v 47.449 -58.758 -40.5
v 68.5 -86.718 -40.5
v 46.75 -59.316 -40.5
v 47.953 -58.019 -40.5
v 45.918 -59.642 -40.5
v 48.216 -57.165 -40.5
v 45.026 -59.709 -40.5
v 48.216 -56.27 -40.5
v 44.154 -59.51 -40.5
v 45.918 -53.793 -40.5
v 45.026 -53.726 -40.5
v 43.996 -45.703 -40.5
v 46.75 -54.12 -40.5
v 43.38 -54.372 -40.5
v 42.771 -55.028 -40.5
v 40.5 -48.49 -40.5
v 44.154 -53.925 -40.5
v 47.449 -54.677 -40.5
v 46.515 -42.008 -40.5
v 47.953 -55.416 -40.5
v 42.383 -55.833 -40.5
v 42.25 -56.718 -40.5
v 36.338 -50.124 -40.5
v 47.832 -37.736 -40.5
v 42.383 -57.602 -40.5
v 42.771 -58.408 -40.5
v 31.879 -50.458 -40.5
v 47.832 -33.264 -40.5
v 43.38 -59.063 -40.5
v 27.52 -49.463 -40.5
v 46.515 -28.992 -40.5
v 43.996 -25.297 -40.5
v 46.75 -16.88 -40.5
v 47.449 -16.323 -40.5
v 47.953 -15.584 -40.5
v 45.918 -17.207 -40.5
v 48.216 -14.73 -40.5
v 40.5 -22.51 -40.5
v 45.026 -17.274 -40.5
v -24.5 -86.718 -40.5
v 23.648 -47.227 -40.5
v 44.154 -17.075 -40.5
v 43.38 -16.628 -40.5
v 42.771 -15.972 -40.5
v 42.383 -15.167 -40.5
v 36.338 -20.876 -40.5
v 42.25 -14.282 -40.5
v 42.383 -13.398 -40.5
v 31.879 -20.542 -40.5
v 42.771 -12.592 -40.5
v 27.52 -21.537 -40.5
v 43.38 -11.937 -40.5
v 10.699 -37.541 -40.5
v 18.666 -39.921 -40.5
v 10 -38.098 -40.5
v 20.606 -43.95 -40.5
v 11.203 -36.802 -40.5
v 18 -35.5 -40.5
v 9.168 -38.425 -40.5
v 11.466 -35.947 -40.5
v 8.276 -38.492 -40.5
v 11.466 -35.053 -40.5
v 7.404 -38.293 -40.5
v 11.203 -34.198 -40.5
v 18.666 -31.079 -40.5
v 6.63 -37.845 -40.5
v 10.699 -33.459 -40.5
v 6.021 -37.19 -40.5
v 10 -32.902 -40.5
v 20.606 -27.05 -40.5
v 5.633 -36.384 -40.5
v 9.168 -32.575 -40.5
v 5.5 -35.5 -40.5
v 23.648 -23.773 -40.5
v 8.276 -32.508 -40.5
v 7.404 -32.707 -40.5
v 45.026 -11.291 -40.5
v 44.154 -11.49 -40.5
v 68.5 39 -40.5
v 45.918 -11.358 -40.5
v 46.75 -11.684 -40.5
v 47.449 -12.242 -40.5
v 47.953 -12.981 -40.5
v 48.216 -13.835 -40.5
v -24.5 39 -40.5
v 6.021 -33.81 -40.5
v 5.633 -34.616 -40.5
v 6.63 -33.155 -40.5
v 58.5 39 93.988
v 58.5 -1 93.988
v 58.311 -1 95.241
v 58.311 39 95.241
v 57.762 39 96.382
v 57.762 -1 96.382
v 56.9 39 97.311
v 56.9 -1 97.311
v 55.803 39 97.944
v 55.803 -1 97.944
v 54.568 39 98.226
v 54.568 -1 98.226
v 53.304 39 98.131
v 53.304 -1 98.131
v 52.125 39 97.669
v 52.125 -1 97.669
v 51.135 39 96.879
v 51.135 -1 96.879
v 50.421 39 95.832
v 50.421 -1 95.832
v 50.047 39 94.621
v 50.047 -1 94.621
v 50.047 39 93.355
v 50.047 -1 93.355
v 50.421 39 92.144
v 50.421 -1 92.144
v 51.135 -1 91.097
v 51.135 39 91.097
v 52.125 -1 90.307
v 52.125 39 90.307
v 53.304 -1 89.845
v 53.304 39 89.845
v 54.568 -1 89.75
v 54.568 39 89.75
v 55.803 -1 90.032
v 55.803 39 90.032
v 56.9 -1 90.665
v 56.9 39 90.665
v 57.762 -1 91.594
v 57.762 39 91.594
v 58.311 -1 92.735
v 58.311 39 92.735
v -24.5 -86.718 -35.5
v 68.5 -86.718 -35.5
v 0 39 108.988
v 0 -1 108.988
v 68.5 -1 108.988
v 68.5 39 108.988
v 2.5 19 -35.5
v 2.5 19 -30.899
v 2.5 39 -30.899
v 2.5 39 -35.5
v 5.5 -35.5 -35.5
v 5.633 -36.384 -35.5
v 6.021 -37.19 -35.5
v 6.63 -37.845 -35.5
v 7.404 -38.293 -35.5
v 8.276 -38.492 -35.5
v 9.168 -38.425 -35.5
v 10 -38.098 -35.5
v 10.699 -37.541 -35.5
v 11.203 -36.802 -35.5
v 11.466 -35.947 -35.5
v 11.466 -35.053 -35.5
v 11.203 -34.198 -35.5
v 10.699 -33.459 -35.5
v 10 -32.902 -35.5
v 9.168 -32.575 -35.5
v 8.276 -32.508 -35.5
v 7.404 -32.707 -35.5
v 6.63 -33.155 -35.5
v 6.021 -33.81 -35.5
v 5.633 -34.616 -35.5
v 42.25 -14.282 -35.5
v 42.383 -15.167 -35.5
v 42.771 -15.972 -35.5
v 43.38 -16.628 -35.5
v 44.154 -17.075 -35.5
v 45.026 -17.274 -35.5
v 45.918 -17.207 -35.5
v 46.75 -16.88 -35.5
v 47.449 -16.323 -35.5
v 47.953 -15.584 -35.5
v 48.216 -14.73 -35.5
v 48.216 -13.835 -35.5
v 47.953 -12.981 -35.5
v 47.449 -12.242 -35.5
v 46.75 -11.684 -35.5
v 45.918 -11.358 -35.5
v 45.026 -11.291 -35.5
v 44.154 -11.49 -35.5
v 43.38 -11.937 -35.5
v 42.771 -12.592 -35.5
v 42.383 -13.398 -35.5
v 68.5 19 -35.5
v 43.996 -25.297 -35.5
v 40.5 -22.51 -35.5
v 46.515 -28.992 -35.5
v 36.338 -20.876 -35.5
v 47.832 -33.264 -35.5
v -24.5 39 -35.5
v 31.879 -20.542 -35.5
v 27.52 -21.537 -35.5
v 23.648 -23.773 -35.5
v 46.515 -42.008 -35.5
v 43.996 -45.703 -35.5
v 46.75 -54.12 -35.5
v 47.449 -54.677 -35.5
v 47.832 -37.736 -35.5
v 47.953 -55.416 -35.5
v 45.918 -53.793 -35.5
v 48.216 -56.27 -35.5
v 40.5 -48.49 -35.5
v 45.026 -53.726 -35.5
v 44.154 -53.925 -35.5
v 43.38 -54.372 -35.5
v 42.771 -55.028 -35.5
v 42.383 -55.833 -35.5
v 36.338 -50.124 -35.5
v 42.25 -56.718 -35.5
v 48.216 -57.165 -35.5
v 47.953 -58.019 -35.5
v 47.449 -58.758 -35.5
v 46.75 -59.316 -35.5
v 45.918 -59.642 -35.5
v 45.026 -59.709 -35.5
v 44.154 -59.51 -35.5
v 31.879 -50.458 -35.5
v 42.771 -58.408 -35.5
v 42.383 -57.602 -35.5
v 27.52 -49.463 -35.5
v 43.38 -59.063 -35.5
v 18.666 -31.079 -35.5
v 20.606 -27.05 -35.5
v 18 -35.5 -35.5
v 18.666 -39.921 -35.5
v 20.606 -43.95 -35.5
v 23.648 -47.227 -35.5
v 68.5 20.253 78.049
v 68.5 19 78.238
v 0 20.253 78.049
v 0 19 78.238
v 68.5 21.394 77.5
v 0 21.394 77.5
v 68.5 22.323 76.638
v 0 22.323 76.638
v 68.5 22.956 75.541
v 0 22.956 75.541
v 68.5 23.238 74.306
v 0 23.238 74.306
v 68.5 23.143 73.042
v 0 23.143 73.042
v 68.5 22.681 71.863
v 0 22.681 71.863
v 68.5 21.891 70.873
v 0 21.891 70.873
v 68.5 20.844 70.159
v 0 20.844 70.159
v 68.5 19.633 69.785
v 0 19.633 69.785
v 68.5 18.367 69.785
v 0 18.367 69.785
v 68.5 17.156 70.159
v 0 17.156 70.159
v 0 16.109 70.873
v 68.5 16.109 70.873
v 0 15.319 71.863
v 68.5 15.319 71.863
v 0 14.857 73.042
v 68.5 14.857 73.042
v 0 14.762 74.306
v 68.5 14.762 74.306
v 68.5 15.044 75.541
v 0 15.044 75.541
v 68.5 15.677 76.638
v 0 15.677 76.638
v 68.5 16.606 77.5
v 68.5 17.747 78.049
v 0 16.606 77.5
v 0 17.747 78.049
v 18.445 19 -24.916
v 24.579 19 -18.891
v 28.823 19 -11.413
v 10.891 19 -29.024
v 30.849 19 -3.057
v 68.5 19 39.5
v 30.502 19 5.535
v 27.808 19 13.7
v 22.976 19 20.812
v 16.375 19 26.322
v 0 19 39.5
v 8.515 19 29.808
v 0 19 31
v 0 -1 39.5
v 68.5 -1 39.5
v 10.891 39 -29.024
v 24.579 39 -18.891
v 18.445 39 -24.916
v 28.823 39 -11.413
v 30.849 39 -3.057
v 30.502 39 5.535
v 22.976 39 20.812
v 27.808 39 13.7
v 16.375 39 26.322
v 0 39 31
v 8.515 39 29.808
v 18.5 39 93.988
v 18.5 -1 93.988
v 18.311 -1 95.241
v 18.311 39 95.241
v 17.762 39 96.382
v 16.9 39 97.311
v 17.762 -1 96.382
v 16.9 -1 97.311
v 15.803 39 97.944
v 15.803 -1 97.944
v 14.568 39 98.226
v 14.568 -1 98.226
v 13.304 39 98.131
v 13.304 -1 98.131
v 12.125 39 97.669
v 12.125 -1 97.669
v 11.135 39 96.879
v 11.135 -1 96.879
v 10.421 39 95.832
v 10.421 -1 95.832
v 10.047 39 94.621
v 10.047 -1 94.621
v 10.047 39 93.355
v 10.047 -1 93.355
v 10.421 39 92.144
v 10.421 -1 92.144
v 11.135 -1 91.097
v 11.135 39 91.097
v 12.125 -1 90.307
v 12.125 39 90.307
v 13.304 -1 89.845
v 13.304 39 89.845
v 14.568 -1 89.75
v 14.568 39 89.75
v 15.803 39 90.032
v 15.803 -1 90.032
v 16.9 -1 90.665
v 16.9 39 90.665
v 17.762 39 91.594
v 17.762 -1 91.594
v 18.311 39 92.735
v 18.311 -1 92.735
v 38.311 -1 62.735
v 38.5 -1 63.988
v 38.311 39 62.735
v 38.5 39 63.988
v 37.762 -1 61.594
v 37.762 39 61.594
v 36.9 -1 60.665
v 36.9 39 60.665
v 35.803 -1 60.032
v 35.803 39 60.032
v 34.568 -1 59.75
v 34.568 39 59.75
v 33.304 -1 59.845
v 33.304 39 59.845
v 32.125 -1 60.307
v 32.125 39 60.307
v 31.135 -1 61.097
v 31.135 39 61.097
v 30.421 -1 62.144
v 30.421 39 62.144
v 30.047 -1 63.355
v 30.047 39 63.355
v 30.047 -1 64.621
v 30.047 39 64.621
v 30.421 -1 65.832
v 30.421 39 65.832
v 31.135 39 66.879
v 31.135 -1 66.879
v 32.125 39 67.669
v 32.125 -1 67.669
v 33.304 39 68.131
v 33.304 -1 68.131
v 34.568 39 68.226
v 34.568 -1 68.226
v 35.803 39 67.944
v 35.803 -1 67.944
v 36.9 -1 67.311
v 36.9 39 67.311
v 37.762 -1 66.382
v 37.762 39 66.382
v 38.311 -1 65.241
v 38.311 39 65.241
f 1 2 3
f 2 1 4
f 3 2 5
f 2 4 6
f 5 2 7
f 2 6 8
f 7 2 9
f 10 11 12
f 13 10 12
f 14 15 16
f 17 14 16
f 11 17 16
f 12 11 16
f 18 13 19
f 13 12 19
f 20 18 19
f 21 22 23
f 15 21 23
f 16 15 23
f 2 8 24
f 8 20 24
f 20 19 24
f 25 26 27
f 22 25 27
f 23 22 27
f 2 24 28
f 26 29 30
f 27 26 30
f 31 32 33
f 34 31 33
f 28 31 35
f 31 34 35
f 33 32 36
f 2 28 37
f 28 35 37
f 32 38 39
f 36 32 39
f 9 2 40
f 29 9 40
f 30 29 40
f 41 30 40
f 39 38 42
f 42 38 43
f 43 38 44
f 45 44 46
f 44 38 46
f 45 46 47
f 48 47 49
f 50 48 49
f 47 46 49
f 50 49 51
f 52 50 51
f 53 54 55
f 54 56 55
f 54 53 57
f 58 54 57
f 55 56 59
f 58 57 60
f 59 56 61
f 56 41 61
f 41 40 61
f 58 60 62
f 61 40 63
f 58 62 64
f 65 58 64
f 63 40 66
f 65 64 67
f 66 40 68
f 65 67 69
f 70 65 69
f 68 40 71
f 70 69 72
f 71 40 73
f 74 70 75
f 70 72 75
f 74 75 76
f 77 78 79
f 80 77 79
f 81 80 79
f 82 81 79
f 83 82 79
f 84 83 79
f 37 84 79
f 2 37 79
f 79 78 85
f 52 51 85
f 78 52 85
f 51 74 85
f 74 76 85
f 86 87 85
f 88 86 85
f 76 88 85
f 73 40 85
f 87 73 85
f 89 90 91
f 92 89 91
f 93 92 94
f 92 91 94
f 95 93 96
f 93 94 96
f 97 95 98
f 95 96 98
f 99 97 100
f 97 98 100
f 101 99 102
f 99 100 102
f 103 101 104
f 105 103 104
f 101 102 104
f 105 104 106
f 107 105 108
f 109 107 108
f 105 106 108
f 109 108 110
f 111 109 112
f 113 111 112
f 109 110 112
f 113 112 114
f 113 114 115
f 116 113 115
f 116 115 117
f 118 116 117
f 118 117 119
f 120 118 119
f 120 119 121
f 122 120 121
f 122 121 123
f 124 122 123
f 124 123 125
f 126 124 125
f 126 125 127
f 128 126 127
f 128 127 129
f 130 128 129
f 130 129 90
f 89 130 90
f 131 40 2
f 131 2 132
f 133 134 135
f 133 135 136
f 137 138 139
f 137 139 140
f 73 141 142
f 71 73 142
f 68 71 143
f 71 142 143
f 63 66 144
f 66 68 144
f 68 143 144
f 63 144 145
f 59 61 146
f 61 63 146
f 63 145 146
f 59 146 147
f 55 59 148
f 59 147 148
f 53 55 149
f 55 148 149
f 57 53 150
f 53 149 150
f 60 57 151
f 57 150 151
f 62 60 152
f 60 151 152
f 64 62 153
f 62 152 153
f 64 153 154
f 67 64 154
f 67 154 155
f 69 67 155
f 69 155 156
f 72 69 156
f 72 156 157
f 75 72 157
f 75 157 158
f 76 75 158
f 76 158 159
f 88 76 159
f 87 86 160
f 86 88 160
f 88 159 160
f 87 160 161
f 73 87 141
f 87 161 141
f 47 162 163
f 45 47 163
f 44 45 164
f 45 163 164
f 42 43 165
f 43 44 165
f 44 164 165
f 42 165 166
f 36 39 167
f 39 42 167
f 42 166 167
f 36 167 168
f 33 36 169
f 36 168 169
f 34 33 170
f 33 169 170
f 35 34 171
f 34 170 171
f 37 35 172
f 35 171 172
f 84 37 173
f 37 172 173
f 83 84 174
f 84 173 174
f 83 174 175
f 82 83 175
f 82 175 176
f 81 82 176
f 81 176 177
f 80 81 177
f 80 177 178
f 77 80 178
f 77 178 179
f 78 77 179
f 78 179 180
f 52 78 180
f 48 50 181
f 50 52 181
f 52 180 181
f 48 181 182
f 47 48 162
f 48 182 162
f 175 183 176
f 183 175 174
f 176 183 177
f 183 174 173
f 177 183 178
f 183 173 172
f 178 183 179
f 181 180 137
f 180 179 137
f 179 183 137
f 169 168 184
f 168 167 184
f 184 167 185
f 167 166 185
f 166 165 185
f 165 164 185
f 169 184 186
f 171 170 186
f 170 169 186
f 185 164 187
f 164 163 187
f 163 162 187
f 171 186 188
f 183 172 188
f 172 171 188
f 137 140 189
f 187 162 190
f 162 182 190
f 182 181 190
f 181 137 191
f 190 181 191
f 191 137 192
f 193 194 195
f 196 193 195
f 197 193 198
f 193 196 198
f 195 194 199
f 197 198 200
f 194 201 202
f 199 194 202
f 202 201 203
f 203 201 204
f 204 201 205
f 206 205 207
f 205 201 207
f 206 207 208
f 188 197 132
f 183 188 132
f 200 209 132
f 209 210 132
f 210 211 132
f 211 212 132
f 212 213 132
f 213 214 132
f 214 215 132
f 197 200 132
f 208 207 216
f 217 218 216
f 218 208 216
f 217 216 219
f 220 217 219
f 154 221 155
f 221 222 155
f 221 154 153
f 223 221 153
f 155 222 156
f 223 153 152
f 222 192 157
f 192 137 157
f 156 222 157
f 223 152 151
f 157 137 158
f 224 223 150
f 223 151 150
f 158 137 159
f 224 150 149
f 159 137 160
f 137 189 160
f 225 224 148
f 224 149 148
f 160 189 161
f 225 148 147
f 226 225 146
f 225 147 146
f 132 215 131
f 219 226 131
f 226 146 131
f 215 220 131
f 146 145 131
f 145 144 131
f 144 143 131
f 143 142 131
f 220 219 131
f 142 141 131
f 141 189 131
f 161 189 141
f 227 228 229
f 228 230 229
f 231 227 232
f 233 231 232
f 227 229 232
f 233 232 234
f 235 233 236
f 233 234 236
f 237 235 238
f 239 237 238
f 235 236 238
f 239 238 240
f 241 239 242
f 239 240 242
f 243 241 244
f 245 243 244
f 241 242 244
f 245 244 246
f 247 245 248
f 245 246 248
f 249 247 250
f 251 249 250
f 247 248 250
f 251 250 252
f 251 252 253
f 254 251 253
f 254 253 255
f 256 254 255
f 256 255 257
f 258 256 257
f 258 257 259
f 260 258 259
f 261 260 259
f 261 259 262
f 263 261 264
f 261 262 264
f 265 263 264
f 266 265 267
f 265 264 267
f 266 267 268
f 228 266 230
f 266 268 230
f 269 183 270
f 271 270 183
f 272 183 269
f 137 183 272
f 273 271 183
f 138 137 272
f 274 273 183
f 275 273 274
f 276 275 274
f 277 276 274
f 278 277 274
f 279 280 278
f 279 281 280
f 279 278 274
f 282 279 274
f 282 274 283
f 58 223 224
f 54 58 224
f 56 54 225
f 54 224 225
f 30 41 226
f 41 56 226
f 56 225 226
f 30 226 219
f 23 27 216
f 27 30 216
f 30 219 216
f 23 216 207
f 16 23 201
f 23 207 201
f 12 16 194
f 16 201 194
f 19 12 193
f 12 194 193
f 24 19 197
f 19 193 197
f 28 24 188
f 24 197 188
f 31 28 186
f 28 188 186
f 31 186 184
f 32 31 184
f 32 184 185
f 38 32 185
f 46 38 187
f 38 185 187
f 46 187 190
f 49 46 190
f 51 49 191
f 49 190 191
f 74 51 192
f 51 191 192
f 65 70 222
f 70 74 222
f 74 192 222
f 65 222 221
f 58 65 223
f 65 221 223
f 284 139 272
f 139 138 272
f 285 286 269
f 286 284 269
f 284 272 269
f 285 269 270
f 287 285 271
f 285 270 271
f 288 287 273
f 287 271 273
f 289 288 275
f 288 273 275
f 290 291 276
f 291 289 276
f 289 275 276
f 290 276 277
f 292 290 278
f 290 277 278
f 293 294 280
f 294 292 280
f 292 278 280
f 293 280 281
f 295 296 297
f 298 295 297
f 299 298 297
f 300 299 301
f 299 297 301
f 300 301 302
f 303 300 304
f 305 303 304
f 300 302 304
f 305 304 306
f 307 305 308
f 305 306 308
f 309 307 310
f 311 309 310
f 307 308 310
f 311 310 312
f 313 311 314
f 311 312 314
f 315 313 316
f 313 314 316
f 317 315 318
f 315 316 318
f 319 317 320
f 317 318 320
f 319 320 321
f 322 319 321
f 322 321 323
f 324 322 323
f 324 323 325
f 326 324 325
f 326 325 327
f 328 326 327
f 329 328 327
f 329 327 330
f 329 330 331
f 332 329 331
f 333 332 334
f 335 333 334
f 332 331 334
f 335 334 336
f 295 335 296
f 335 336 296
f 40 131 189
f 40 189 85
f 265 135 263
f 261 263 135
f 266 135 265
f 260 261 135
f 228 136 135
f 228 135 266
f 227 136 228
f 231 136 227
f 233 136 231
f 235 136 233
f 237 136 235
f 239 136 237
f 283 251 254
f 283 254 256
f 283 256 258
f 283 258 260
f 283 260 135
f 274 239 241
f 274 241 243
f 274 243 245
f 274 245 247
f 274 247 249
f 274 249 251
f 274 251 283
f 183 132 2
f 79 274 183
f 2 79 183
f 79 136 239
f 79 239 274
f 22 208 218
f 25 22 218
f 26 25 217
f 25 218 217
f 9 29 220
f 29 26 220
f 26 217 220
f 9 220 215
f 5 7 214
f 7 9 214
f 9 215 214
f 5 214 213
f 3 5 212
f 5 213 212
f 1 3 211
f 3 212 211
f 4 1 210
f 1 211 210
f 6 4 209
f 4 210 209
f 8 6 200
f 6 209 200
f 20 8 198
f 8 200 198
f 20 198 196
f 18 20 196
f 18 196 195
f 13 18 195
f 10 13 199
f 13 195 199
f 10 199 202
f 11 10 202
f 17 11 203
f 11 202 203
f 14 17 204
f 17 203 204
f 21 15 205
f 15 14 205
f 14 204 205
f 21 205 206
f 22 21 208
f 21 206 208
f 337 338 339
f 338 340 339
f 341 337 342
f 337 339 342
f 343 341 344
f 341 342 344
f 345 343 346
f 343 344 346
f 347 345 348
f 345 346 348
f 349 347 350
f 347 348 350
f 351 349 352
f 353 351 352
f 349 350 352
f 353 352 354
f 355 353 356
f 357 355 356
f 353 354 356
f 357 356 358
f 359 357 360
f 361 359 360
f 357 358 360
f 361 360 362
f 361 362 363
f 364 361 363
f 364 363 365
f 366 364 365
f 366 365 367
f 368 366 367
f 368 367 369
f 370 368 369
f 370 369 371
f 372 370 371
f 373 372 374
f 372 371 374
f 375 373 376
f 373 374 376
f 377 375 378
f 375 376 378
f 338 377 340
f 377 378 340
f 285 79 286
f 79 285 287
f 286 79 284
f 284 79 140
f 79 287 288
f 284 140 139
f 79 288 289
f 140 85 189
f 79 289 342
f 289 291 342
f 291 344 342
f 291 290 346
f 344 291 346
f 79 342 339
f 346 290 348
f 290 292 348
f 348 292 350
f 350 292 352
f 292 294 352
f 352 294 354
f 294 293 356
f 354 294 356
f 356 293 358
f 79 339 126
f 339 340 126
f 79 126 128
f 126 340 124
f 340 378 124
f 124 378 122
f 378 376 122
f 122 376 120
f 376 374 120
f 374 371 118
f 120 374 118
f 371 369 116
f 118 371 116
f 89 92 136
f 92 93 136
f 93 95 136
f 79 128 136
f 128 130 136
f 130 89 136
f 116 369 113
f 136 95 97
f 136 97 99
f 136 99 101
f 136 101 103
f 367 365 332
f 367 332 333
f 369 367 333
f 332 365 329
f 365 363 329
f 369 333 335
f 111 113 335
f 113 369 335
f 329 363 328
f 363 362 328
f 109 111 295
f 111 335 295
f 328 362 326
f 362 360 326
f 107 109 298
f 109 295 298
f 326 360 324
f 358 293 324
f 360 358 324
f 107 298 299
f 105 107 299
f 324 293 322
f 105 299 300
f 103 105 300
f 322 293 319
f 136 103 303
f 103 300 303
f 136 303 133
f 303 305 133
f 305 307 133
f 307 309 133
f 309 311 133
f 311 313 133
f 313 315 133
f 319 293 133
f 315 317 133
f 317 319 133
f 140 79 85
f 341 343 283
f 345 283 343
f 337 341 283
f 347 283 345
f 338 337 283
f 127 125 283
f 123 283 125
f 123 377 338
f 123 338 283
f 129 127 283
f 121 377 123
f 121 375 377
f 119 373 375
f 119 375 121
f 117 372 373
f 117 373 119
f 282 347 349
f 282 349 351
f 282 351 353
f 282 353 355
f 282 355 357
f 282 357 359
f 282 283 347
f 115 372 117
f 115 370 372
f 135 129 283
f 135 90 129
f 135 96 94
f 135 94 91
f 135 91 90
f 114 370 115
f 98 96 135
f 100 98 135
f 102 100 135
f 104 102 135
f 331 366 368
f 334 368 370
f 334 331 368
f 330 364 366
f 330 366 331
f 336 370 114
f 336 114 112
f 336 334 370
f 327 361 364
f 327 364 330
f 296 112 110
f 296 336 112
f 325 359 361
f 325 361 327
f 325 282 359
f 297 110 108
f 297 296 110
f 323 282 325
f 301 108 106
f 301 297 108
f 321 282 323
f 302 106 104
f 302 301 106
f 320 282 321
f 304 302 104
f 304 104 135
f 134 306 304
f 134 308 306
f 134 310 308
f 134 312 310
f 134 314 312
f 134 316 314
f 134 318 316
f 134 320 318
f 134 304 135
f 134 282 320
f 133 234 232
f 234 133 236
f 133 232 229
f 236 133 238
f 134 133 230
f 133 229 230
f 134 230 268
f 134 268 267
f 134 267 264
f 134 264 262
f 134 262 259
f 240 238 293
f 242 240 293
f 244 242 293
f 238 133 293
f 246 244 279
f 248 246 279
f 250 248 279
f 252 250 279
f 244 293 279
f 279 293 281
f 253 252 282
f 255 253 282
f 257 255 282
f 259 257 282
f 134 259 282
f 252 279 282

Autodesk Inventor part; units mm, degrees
ref_plane "YZ Plane" through (0, 0, 0) normal (1, 0, 0) x (0, 1, 0)
ref_plane "XZ Plane" through (0, 0, 0) normal (0, 1, 0) x (-1, 0, 0)
ref_plane "Work Plane1" through (8.5, -35.5, -35.5) normal (0, 0, -1) x (-1, 0, 0)
sketch "Sketch1" plane through (8.5, -35.5, -35.5) normal (0, 0, -1) x (-1, 0, 0)
  circle A0 centre (0, 0) radius 3 projected
  circle A1 centre (0, 0) radius 6 projected
  circle A2 centre (-36.75, -21.2176) radius 3 projected
  circle A3 centre (-36.75, -21.2176) radius 6 projected
  circle A4 centre (-36.75, 21.2176) radius 6 projected
  circle A5 centre (-36.75, 21.2176) radius 3 projected
  line L0 (-36.75, -46.2176) -> (28, -46.2176)
  line L1 (28, -46.2176) -> (28, 0)
  line L2 (-36.75, -46.2176) -> (-59, -46.2176)
  line L3 (-59, -46.2176) -> (-59, 34.5)
  line L4 (-59, 34.5) -> (28, 34.5)
  line L5 (34.5, 35.5) -> (-17.5, 35.5) projected
  line L6 (28, 34.5) -> (28, 0)
  circle A6 centre (-24.5, 0) radius 11 projected
  circle A7 centre (-24.5, 0) radius 15
  point P0 (8.5, 35.5)
  dimension "d3" = 30
extrude "Extrusion1" add sketch "Sketch1" along normal blind 5 contours A1 | A3 | A4 | L2 L3 L4 L6 L1 L0
sketch "Sketch2" plane through (-19.5, -81.7176, -35.5) normal (-1, 0, 0) x (0, 0, 1)
  line L0 (0, 0) -> (0, 80.7176) projected
  line L1 (0, 80.7176) -> (-5, 80.7176) projected
  line L2 (-5, 0) -> (-5, 80.7176) projected
  line L3 (0, 0) -> (-5, 0) projected
  point P0 (35.5, 81.7176)
extrude "Extrusion2" add sketch "Sketch2" along normal blind 5
sketch "Sketch3" plane through (67.5, -81.7176, -40.5) normal (0, -1, 0) x (1, 0, 0)
  line L0 (0, 5) -> (-92, 5) projected
  line L1 (-92, 0) -> (-92, 5) projected
  line L2 (0, 0) -> (-92, 0) projected
  line L3 (0, 5) -> (0, 0) projected
  point P0 (-67.5, 40.5)
extrude "Extrusion3" add sketch "Sketch3" along normal blind 5
sketch "Sketch4" plane through (8.5, -35.5, -35.5) normal (0, 0, 1) x (1, 0, 0)
  line L0 (-28, -46.2176) -> (-28, 34.5)
  line L1 (-28, -46.2176) -> (59, -46.2176)
  line L2 (59, -51.2176) -> (-33, -51.2176) projected
  line L3 (-33, 34.5) -> (-33, -51.2176) projected
  line L4 (59, 34.5) -> (59, -51.2176) projected
  line L5 (59, 34.5) -> (-33, 34.5) projected
  line L6 (-28, -46.2176) -> (-33, -46.2176)
  line L7 (-33, 34.5) -> (-33, -51.2176) projected
extrude "Extrusion4" add sketch "Sketch4" along normal blind 75 contours L1 L4 L2 L3 L6
sketch "Sketch5" plane through (67.5, -86.7176, -40.5) normal (0, -1, 0) x (1, 0, 0)
  line L0 (-92, 5) -> (-92, 80) projected
  line L1 (-92, 80) -> (-77.75, 80)
  line L2 (-92, 80) -> (0, 80) projected
  line L3 (-77.75, 80) -> (-37.75, 80)
  line L4 (-37.75, 80) -> (-37.75, 65)
  line L5 (-37.75, 65) -> (-77.75, 65)
  circle A0 centre (-77.75, 65) radius 4.25
  circle A1 centre (-37.75, 65) radius 4.25
  point P0 (-67.5, 40.5)
  dimension "d14" = 14.25
  dimension "d15" = 40
  dimension "d16" = 15
  dimension "d17" = 8.5
  dimension "d18" = 8.5
extrude "Extrusion5" cut sketch "Sketch5" against normal through all
sketch "Sketch6" plane through (67.5, -1, -35.5) normal (0, 1, 0) x (1, 0, 0)
  line L0 (0, 0) -> (-92, 0) projected
  line L1 (0, 0) -> (0, 5) projected
  line L2 (0, 5) -> (-92, 5) projected
  line L3 (-92, 0) -> (-92, 5) projected
  point P0 (-67.5, -35.5)
extrude "Extrusion6" add sketch "Sketch6" along normal blind 20
sketch "Sketch7" plane through (67.5, 19, -35.5) normal (0, 1, 0) x (1, 0, 0)
  circle A0 centre (-67.5, -35.5) radius 31 projected
  circle A1 centre (-67.5, -35.5) radius 31 projected
  circle A2 centre (-67.5, -35.5) radius 31 projected
  line L0 (-67.5, -66.5) -> (-67.5, -75)
  line L1 (0, -75) -> (-92, -75) projected
  line L2 (0, 5) -> (0, -75) projected
  line L3 (-67.5, -75) -> (0, -75)
  line L4 (0, -75) -> (0, 5)
  line L5 (-65, -20.5) -> (-65, 0) projected
  line L6 (-65, -4.601) -> (-65, 0)
  line L7 (-92, 5) -> (-92, 0) projected
  line L8 (-92, 0) -> (0, 0) projected
  line L9 (0, 0) -> (0, 5) projected
  line L10 (0, 5) -> (-92, 5) projected
  point P0 (-65, -4.601)
extrude "Extrusion7" add sketch "Sketch7" along normal blind 20 contours A0 L5 L8 L2 L1 L0 | L8 L7 L10 L2
sketch "Sketch10" plane through (8.5, -35.5, 39.5) normal (0, 0, 1) x (1, 0, 0)
  line L0 (59, -51.2176) -> (59, -46.2176) projected
  line L1 (59, -46.2176) -> (-33, -46.2176) projected
  line L2 (-33, -46.2176) -> (-33, -51.2176) projected
  line L3 (-33, -51.2176) -> (59, -51.2176) projected
  point P0 (-8.5, 35.5)
extrude "Extrusion10" cut sketch "Sketch10" against normal up to surface (75 mm away)
sketch "Sketch11" plane through (0, 19, 39.5) normal (0, 0, 1) x (1, 0, 0)
  line L0 (0, 0) -> (67.5, 0) projected
  line L1 (67.5, 0) -> (67.5, 20) projected
  line L2 (0, 20) -> (67.5, 20) projected
  line L3 (0, 0) -> (0, 20) projected
  point P0 (0, -19)
extrude "Extrusion11" add sketch "Sketch11" along normal blind 10
sketch "Sketch12" plane through (67.5, 19, -35.5) normal (0, -1, 0) x (1, 0, 0)
  line L0 (-67.5, 66.5) -> (-67.5, 85) projected
  line L1 (-67.5, 85) -> (0, 85) projected
  line L2 (-67.5, 85) -> (0, 85)
  line L3 (0, 85) -> (0, 75)
  line L4 (0, 0) -> (0, 85) projected
  line L5 (0, 75) -> (-67.5, 75)
  line L6 (-67.5, 75) -> (-67.5, 85)
  point P0 (-67.5, 35.5)
  dimension "d35" = 10
extrude "Extrusion12" add sketch "Sketch12" along normal blind 20
sketch "Sketch13" plane through (0, 19, 49.5) normal (0, 0, 1) x (1, 0, 0)
  line L0 (67.5, 20) -> (67.5, -20) projected
  line L1 (67.5, 20) -> (0, 20) projected
  line L2 (0, 20) -> (0, -20) projected
  line L3 (67.5, -20) -> (0, -20) projected
  point P0 (0, -19)
extrude "Extrusion13" add sketch "Sketch13" along normal blind 59.488
sketch "Sketch14" plane through (67.5, -1, -35.5) normal (0, -1, 0) x (1, 0, 0)
  line L0 (-53.25, 129.488) -> (-13.25, 129.488)
  circle A0 centre (-53.25, 129.488) radius 4.25
  circle A1 centre (-13.25, 129.488) radius 4.25
  point P0 (-67.5, 35.5)
  point P1 (-67.5, 144.488)
  dimension "d43" = 40
  dimension "d44" = 8.5
  dimension "d45" = 8.5
extrude "Extrusion14" cut sketch "Sketch14" against normal up to surface (40 mm away)
sketch "Sketch15" plane through (67.5, -86.7176, -40.5) normal (1, 0, 0) x (0, 0, -1)
  line L0 (-5, 105.7176) -> (-5, 0) projected
  line L1 (0, 0) -> (-5, 0) projected
  line L2 (0, 0) -> (0, 125.7176) projected
  line L3 (0, 125.7176) -> (-149.488, 125.7176) projected
  line L4 (-149.488, 85.7176) -> (-149.488, 125.7176) projected
  line L5 (-80, 85.7176) -> (-149.488, 85.7176) projected
  line L6 (-80, 105.7176) -> (-80, 85.7176) projected
  line L7 (-5, 105.7176) -> (-80, 105.7176) projected
  point P0 (-40.5, 86.7176)
extrude "Extrusion15" add sketch "Sketch15" along normal blind 1
sketch "Sketch16" plane through (0, 19, 31) normal (-1, 0, 0) x (0, 0, 1)
  line L0 (77.988, 20) -> (77.988, -20) projected
  line L1 (77.988, 0) -> (42.988, 0)
  circle A0 centre (42.988, 0) radius 4.25
  point P0 (-31, -19)
  dimension "d50" = 35
  dimension "d51" = 8.5
extrude "Extrusion16" cut sketch "Sketch16" against normal up to surface (68.5 mm away)
sketch "Sketch17" plane through (67.5, 39, -35.5) normal (0, 1, 0) x (1, 0, 0)
  circle A0 centre (-53.25, -129.488) radius 4.25 projected
  line L0 (-53.25, -129.488) -> (-33.25, -129.488)
  line L1 (-33.25, -129.488) -> (-33.25, -99.488)
  circle A1 centre (-33.25, -99.488) radius 4.25
  point P0 (-67.5, -35.5)
  dimension "d54" = 20
  dimension "d55" = 30
  dimension "d56" = 8.5
extrude "Extrusion17" cut sketch "Sketch17" against normal up to surface (40 mm away) contours A1
properties part number "motor_connector_left"
